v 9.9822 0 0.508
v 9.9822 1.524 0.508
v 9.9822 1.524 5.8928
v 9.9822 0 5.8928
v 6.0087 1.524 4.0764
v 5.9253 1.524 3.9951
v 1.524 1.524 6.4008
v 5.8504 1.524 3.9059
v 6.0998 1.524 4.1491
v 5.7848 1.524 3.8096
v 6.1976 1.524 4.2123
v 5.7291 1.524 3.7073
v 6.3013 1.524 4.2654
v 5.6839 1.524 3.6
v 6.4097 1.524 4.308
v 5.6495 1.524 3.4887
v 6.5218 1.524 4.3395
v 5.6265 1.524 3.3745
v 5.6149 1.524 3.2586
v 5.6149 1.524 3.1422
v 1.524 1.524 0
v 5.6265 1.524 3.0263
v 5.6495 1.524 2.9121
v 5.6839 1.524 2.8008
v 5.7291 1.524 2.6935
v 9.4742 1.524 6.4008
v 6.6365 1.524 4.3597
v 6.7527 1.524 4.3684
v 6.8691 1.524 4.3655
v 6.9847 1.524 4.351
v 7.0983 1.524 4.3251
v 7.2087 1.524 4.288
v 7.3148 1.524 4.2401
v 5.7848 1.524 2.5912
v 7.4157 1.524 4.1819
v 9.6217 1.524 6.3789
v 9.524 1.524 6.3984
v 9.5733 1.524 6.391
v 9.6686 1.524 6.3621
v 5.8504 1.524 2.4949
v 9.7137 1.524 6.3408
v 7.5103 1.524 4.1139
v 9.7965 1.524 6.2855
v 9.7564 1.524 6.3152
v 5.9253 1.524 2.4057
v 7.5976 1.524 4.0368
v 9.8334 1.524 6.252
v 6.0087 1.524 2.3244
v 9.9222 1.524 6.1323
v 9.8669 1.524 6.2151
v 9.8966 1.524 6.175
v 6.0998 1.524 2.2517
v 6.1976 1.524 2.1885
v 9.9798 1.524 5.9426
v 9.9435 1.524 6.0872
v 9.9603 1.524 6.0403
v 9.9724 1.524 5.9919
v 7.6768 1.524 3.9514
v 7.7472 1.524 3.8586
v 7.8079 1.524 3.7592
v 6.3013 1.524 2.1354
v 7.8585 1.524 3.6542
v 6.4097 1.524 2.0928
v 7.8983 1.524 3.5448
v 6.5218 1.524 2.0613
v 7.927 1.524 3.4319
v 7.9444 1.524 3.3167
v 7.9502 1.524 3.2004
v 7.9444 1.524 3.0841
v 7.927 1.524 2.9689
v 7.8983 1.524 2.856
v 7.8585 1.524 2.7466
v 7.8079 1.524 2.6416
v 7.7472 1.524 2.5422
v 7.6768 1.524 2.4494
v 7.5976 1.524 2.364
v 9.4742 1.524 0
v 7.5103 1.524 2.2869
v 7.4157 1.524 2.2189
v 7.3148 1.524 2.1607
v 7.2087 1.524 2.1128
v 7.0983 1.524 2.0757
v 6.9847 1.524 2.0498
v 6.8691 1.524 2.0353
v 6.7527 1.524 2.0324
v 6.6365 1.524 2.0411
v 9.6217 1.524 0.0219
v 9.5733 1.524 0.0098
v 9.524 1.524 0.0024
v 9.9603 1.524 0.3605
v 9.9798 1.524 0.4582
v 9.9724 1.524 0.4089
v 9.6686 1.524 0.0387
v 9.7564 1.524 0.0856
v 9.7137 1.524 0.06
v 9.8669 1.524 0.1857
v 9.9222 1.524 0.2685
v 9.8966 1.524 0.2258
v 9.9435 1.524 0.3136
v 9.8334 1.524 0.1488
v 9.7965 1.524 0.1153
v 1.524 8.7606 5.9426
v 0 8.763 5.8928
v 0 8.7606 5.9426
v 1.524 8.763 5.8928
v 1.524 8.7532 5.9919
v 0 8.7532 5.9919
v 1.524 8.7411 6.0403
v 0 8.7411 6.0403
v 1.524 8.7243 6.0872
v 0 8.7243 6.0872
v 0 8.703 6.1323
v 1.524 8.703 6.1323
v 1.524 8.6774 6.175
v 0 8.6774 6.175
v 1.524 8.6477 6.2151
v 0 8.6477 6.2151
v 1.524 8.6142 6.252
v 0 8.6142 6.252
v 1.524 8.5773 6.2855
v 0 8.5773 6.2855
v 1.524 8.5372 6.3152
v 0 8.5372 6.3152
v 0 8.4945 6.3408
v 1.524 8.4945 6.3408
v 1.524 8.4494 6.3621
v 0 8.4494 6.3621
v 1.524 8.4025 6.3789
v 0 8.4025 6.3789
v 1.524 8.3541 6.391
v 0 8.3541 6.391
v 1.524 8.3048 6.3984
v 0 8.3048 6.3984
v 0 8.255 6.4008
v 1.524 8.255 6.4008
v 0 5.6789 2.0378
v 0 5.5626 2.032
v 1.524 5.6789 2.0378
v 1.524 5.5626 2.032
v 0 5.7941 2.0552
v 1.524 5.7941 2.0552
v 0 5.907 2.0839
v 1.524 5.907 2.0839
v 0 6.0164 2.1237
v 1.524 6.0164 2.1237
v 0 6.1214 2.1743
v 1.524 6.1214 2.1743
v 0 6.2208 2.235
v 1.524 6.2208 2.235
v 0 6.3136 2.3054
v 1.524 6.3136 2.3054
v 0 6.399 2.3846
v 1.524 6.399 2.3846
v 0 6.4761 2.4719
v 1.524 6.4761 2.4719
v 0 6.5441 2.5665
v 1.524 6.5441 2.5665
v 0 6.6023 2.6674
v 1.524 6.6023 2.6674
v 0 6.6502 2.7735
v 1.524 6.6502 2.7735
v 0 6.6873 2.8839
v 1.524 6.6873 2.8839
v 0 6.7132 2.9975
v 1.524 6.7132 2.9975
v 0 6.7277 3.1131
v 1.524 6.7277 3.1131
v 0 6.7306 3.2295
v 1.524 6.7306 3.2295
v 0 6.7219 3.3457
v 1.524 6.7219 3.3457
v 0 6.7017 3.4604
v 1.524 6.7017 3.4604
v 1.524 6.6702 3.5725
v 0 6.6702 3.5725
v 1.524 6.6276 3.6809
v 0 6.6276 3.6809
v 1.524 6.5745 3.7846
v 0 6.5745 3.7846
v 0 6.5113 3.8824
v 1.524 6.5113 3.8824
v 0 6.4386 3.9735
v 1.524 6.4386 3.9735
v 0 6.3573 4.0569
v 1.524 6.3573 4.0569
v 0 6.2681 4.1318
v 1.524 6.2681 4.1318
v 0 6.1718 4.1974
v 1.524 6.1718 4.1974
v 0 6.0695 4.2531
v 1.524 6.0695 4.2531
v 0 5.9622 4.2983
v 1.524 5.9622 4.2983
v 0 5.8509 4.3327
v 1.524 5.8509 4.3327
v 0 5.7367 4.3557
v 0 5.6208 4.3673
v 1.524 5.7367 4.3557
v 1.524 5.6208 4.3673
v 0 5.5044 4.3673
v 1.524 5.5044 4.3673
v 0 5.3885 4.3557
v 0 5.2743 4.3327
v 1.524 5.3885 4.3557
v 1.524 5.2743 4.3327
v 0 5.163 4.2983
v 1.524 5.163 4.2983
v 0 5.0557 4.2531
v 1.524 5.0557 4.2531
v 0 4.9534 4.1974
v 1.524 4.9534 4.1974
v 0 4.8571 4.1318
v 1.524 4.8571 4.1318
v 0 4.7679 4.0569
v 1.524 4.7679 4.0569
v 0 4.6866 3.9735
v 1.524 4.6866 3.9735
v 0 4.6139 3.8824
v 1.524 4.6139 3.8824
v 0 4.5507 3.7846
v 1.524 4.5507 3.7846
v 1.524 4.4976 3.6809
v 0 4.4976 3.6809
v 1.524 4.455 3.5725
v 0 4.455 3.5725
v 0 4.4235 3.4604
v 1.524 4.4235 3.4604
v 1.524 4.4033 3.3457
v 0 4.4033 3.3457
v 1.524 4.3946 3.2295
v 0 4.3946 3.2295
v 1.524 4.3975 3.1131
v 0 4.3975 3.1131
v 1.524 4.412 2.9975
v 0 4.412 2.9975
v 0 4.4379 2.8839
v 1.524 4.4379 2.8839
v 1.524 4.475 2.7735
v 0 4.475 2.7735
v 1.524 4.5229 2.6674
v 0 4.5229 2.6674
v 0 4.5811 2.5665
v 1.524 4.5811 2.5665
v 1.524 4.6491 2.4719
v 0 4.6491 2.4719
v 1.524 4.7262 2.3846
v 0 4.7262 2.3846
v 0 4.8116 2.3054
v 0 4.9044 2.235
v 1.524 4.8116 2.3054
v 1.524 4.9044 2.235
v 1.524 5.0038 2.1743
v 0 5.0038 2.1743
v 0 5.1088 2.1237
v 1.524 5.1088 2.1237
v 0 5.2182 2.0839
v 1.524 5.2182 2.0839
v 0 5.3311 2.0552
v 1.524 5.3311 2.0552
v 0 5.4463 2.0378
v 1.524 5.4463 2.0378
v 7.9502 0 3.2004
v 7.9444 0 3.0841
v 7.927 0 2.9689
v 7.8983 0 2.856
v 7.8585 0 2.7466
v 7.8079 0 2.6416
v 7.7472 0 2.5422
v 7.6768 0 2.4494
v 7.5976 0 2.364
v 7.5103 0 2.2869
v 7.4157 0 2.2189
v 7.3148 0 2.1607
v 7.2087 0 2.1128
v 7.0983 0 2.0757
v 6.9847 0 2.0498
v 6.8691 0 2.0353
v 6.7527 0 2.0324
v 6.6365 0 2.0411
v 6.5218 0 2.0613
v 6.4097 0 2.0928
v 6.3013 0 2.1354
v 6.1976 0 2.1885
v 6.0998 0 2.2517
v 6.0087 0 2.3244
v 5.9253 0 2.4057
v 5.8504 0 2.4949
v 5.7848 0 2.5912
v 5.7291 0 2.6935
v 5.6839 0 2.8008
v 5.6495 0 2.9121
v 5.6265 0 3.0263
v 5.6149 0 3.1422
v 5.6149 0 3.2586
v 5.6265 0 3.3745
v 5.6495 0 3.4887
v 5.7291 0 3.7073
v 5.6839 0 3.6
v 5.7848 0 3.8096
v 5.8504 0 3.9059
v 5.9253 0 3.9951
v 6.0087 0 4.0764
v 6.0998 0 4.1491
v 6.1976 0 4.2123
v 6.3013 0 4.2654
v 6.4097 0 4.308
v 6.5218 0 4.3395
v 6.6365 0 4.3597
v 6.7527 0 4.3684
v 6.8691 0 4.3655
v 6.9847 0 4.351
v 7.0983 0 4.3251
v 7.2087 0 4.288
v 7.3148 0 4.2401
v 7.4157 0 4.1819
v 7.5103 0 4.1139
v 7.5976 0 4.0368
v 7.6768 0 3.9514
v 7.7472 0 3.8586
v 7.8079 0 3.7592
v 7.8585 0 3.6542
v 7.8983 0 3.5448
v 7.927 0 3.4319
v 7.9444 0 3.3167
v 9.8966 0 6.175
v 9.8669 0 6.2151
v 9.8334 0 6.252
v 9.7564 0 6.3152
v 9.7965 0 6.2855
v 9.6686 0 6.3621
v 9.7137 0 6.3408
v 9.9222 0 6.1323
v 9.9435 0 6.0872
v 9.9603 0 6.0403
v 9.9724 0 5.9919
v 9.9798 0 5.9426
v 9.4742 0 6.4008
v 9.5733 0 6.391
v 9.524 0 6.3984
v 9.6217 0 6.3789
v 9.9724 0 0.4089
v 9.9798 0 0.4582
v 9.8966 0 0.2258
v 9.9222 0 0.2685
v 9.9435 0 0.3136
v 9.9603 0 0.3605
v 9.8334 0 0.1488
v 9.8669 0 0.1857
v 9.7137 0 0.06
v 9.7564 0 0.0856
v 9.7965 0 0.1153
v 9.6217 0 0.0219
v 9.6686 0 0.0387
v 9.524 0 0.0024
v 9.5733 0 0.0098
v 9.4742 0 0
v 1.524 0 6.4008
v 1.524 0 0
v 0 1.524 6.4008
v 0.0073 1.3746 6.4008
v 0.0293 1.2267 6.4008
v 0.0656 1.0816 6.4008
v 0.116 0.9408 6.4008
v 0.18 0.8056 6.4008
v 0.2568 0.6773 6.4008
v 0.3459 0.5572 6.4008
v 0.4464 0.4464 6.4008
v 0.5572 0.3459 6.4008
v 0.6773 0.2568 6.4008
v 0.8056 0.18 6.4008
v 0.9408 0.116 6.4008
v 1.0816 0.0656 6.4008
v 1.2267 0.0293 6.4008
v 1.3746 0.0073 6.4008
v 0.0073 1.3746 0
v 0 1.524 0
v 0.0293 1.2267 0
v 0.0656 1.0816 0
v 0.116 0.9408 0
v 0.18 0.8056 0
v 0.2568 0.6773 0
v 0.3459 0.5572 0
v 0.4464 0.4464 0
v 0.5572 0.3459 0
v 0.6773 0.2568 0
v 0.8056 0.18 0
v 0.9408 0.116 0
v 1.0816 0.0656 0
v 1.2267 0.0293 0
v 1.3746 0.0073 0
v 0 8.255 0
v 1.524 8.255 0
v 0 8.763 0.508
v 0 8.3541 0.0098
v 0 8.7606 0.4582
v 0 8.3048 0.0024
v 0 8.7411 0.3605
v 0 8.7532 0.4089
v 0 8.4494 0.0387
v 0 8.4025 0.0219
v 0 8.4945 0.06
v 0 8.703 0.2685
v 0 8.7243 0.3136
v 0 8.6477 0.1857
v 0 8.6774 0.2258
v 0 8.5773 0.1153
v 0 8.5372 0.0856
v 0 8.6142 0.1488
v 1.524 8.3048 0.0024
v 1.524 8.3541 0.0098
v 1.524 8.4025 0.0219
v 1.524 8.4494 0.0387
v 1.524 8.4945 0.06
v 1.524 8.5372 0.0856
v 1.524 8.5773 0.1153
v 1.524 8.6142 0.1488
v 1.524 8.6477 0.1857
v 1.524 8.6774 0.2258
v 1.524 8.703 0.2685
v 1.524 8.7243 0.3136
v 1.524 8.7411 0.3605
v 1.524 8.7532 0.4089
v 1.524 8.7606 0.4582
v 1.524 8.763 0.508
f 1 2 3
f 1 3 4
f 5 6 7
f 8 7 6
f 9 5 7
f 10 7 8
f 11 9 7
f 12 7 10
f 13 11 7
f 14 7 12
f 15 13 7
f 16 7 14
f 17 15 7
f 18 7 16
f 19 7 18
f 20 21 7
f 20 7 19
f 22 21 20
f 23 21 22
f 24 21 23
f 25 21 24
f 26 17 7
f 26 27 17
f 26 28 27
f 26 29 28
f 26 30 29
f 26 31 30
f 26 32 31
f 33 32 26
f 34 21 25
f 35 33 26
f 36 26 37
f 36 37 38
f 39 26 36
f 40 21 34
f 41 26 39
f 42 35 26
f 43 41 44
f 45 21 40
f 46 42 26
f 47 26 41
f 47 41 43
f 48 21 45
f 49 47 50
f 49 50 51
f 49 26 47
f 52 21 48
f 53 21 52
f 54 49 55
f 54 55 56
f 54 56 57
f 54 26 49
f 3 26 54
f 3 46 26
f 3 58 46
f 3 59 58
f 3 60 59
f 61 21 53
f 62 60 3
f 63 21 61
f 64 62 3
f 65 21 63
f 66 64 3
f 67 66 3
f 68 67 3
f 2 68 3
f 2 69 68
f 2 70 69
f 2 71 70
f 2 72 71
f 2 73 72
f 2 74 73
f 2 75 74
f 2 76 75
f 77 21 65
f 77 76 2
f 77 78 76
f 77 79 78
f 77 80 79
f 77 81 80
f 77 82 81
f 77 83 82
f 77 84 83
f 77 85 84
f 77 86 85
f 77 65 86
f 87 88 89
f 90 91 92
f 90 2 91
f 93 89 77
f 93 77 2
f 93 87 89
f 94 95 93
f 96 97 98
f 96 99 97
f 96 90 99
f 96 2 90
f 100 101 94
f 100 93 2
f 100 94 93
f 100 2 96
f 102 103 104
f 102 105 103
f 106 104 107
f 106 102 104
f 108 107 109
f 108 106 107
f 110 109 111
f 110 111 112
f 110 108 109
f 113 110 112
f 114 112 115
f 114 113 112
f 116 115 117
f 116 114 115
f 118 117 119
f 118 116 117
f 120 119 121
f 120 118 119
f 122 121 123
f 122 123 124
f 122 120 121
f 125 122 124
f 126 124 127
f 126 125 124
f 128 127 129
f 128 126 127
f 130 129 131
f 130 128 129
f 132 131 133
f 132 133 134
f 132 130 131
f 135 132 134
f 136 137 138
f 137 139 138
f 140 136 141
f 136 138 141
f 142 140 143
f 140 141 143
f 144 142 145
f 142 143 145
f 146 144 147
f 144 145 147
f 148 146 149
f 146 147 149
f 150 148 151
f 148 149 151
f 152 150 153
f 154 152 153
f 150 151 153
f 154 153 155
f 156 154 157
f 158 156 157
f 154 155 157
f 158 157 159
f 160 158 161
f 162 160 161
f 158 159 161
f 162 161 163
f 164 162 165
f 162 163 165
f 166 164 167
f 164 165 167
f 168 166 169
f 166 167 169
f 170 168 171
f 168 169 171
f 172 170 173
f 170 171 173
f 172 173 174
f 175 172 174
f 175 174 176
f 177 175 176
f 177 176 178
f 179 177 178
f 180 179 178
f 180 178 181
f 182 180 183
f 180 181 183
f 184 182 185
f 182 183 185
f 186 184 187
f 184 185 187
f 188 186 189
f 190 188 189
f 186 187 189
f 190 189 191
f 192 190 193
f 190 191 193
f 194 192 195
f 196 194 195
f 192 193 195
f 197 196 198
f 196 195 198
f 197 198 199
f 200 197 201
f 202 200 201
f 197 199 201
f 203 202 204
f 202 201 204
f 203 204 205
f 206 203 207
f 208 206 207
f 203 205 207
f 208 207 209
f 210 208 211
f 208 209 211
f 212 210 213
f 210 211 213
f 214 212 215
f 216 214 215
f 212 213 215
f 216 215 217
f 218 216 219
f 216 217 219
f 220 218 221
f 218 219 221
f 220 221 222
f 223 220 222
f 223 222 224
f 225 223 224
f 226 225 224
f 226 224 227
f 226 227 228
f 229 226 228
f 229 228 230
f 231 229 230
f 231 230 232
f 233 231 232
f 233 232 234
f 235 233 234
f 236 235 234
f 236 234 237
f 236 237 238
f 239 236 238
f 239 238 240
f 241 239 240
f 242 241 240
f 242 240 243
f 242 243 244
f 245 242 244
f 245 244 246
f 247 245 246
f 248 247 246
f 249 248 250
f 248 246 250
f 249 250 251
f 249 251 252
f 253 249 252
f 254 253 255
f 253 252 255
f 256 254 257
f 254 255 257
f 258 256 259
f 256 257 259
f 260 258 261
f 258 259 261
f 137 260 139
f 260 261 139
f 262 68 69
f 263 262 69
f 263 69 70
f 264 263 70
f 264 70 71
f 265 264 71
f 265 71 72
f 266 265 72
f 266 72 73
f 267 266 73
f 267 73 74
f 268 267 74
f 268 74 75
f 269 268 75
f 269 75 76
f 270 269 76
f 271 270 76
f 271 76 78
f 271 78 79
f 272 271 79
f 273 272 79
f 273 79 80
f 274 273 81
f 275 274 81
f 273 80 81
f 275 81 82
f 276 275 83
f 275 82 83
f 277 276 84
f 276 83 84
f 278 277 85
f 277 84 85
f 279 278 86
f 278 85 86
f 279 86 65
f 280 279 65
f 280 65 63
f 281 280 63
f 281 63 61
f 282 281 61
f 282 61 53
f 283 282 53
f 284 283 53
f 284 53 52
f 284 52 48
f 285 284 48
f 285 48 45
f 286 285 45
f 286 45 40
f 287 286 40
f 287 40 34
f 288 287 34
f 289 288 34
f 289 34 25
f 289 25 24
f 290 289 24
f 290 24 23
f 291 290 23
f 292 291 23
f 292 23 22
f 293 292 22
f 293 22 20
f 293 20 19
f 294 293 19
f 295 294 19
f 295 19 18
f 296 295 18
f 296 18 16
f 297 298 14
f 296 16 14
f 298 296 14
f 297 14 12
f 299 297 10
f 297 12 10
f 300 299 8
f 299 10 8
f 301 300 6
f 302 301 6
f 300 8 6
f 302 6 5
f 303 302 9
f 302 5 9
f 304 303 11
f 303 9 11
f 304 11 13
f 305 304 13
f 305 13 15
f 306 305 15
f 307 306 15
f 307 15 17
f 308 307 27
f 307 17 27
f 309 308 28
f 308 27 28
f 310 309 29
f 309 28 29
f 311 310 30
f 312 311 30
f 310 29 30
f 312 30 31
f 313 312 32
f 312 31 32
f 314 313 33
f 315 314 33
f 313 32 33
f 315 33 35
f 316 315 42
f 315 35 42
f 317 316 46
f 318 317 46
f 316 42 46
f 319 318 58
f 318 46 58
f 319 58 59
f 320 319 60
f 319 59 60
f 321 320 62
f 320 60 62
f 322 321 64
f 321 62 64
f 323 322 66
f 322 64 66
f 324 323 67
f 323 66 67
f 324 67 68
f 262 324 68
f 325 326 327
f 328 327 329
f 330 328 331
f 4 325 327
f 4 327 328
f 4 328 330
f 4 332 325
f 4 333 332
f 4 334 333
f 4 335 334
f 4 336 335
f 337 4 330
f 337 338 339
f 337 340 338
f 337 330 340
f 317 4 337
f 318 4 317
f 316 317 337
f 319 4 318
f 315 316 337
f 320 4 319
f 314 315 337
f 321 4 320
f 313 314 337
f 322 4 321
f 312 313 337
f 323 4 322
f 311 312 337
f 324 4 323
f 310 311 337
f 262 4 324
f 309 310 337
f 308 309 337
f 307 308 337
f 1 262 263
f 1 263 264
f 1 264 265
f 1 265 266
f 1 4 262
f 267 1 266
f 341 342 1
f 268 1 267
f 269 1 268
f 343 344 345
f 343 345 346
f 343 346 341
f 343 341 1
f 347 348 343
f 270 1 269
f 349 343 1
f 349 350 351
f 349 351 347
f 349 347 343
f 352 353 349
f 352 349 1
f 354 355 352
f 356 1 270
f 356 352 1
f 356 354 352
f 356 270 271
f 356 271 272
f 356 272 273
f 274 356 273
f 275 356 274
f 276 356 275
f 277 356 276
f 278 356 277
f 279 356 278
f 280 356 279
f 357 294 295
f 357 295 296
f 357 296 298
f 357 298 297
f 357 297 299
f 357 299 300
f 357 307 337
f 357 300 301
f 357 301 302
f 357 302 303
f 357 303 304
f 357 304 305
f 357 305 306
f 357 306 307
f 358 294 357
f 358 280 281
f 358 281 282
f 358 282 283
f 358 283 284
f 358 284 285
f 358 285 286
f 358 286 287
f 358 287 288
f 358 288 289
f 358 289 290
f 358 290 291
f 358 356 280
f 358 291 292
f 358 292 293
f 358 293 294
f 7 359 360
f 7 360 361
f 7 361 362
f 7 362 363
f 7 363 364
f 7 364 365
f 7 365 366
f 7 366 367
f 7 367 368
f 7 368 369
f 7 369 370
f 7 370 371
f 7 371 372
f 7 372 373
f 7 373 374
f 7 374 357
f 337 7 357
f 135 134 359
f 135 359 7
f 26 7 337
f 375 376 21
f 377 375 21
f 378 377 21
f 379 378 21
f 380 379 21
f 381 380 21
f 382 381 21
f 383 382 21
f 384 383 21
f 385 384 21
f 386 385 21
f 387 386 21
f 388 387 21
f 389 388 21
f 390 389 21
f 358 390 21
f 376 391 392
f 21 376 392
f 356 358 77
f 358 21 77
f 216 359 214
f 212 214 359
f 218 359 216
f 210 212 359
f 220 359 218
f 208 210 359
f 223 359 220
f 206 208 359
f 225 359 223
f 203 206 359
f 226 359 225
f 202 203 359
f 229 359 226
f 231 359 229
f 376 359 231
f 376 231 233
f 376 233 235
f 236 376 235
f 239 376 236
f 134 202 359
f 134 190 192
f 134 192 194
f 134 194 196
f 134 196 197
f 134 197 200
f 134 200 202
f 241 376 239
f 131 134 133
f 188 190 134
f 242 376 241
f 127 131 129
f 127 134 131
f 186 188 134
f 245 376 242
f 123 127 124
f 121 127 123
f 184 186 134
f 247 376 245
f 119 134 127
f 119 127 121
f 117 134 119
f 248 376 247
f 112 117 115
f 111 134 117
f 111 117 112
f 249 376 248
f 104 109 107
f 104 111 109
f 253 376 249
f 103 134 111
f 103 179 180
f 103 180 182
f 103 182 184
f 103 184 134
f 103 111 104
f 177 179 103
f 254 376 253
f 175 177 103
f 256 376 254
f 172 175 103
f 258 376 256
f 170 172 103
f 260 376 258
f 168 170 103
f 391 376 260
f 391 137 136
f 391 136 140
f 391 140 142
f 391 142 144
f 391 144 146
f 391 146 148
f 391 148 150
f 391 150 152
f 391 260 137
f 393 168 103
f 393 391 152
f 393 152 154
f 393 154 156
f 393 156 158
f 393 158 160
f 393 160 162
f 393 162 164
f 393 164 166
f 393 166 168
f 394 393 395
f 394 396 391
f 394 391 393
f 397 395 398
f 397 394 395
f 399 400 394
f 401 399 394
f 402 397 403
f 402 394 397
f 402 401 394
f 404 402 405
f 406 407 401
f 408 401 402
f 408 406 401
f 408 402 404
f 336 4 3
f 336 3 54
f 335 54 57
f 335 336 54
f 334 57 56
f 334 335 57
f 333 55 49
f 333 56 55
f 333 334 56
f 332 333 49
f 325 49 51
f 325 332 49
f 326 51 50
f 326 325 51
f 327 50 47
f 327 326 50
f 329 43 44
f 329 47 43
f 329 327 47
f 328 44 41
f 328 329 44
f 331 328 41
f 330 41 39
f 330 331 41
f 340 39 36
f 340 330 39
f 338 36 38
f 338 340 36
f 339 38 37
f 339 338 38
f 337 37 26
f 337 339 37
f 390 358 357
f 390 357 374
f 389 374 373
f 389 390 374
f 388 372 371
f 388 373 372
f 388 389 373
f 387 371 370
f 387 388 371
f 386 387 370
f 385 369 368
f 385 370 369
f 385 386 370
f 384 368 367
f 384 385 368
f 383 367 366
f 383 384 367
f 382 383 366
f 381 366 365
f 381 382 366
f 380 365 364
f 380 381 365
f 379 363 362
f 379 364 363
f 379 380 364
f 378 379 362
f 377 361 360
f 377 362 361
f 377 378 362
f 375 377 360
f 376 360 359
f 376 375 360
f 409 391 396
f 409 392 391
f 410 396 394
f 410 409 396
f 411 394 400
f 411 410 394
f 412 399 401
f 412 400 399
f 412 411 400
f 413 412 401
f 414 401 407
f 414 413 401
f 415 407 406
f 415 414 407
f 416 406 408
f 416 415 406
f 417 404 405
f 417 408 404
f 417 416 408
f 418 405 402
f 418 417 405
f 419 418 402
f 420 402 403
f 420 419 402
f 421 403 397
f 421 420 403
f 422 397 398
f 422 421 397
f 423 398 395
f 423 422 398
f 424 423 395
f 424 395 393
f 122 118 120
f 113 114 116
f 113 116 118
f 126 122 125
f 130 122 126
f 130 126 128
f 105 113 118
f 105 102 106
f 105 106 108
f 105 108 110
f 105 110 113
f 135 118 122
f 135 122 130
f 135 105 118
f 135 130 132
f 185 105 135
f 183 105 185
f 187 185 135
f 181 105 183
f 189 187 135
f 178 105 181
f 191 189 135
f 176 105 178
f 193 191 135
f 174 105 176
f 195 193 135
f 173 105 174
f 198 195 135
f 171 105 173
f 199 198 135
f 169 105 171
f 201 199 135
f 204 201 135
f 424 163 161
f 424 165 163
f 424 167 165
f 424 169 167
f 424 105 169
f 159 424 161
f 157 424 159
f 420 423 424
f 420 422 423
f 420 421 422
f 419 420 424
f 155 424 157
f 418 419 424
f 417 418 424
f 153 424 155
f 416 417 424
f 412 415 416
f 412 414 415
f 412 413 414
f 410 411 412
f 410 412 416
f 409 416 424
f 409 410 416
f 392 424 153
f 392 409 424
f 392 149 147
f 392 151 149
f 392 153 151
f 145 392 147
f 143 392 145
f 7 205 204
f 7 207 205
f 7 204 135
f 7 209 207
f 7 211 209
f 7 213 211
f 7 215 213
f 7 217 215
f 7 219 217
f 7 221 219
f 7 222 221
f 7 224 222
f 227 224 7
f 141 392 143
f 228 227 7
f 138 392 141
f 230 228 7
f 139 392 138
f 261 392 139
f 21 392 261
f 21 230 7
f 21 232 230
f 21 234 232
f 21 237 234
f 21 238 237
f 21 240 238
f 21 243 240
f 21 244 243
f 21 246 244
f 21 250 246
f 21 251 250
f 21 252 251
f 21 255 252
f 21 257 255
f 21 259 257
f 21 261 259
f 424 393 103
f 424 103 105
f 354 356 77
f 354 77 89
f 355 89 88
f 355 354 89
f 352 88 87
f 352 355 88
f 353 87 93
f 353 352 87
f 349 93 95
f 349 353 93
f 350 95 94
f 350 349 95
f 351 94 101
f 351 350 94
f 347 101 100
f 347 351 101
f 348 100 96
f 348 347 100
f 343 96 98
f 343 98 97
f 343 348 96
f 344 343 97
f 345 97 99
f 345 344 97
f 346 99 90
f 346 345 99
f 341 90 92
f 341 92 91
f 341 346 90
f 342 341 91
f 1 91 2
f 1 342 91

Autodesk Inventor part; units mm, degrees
ref_plane "YZ Plane" through (0, 0, 0) normal (1, 0, 0) x (0, 1, 0)
ref_plane "XZ Plane" through (0, 0, 0) normal (0, 1, 0) x (-1, 0, 0)
ref_plane "XY Plane" through (0, 0, 0) normal (0, 0, 1) x (1, 0, 0)
sketch "Sketch2" plane through (0, 0, 0) normal (0, 0, 1) x (1, 0, 0)
  line L0 (0, 8.763) -> (1.524, 8.763)
  line L1 (1.524, 8.763) -> (1.524, 1.524)
  line L2 (1.524, 1.524) -> (0, 1.524)
  line L3 (0, 1.524) -> (0, 8.763)
  line L4 (1.524, 1.524) -> (9.9822, 1.524)
  line L5 (9.9822, 1.524) -> (9.9822, 0)
  line L6 (9.9822, 0) -> (1.524, 0)
  line L7 (1.524, 0) -> (1.524, 1.524)
  arc A0 (0, 1.524) -> (1.524, 0) centre (1.524, 1.524) ccw
  point P0 (0, 0)
  dimension "d9" = 1.524
  dimension "d10" = 7.239
  dimension "d11" = 8.4582
extrude "Extrusion2" add sketch "Sketch2" along normal blind 6.4008
fillet "Fillet2" radius 0.508 4 edges at (0.762, 8.763, 6.4008) (0.762, 8.763, 0) (9.9822, 0.762, 6.4008) (9.9822, 0.762, 0)
sketch "Sketch3" plane through (1.524, 1.524, 6.4008) normal (0, 1, 0) x (1, 0, 0)
  circle A0 centre (5.2578, 3.2004) radius 1.1684
  line L0 (8.4582, 5.8928) -> (8.4582, 0.508) projected
  line L1 (7.9502, 0) -> (0, 0) projected
  point P0 (-1.524, 6.4008)
  point P1 (8.4582, 3.2004)
  dimension "d15" = 3.2004
  dimension "d16" = 3.2004
  dimension "d17" = 2.3368
extrude "Extrusion3" cut sketch "Sketch3" against normal through all
sketch "Sketch4" plane through (1.524, 1.524, 6.4008) normal (1, 0, 0) x (0, 0, -1)
  circle A0 centre (3.2004, 4.0386) radius 1.1684
  line L0 (5.8928, 7.239) -> (0.508, 7.239) projected
  line L1 (6.4008, 0) -> (6.4008, 6.731) projected
  point P0 (6.4008, -1.524)
  point P1 (3.2004, 7.239)
  dimension "d20" = 3.2004
  dimension "d21" = 3.2004
  dimension "d22" = 2.3368
extrude "Extrusion4" cut sketch "Sketch4" against normal through all
equation "\"d15\" = d16"
equation "\"d21\" = d20"
properties part number "elbow"
